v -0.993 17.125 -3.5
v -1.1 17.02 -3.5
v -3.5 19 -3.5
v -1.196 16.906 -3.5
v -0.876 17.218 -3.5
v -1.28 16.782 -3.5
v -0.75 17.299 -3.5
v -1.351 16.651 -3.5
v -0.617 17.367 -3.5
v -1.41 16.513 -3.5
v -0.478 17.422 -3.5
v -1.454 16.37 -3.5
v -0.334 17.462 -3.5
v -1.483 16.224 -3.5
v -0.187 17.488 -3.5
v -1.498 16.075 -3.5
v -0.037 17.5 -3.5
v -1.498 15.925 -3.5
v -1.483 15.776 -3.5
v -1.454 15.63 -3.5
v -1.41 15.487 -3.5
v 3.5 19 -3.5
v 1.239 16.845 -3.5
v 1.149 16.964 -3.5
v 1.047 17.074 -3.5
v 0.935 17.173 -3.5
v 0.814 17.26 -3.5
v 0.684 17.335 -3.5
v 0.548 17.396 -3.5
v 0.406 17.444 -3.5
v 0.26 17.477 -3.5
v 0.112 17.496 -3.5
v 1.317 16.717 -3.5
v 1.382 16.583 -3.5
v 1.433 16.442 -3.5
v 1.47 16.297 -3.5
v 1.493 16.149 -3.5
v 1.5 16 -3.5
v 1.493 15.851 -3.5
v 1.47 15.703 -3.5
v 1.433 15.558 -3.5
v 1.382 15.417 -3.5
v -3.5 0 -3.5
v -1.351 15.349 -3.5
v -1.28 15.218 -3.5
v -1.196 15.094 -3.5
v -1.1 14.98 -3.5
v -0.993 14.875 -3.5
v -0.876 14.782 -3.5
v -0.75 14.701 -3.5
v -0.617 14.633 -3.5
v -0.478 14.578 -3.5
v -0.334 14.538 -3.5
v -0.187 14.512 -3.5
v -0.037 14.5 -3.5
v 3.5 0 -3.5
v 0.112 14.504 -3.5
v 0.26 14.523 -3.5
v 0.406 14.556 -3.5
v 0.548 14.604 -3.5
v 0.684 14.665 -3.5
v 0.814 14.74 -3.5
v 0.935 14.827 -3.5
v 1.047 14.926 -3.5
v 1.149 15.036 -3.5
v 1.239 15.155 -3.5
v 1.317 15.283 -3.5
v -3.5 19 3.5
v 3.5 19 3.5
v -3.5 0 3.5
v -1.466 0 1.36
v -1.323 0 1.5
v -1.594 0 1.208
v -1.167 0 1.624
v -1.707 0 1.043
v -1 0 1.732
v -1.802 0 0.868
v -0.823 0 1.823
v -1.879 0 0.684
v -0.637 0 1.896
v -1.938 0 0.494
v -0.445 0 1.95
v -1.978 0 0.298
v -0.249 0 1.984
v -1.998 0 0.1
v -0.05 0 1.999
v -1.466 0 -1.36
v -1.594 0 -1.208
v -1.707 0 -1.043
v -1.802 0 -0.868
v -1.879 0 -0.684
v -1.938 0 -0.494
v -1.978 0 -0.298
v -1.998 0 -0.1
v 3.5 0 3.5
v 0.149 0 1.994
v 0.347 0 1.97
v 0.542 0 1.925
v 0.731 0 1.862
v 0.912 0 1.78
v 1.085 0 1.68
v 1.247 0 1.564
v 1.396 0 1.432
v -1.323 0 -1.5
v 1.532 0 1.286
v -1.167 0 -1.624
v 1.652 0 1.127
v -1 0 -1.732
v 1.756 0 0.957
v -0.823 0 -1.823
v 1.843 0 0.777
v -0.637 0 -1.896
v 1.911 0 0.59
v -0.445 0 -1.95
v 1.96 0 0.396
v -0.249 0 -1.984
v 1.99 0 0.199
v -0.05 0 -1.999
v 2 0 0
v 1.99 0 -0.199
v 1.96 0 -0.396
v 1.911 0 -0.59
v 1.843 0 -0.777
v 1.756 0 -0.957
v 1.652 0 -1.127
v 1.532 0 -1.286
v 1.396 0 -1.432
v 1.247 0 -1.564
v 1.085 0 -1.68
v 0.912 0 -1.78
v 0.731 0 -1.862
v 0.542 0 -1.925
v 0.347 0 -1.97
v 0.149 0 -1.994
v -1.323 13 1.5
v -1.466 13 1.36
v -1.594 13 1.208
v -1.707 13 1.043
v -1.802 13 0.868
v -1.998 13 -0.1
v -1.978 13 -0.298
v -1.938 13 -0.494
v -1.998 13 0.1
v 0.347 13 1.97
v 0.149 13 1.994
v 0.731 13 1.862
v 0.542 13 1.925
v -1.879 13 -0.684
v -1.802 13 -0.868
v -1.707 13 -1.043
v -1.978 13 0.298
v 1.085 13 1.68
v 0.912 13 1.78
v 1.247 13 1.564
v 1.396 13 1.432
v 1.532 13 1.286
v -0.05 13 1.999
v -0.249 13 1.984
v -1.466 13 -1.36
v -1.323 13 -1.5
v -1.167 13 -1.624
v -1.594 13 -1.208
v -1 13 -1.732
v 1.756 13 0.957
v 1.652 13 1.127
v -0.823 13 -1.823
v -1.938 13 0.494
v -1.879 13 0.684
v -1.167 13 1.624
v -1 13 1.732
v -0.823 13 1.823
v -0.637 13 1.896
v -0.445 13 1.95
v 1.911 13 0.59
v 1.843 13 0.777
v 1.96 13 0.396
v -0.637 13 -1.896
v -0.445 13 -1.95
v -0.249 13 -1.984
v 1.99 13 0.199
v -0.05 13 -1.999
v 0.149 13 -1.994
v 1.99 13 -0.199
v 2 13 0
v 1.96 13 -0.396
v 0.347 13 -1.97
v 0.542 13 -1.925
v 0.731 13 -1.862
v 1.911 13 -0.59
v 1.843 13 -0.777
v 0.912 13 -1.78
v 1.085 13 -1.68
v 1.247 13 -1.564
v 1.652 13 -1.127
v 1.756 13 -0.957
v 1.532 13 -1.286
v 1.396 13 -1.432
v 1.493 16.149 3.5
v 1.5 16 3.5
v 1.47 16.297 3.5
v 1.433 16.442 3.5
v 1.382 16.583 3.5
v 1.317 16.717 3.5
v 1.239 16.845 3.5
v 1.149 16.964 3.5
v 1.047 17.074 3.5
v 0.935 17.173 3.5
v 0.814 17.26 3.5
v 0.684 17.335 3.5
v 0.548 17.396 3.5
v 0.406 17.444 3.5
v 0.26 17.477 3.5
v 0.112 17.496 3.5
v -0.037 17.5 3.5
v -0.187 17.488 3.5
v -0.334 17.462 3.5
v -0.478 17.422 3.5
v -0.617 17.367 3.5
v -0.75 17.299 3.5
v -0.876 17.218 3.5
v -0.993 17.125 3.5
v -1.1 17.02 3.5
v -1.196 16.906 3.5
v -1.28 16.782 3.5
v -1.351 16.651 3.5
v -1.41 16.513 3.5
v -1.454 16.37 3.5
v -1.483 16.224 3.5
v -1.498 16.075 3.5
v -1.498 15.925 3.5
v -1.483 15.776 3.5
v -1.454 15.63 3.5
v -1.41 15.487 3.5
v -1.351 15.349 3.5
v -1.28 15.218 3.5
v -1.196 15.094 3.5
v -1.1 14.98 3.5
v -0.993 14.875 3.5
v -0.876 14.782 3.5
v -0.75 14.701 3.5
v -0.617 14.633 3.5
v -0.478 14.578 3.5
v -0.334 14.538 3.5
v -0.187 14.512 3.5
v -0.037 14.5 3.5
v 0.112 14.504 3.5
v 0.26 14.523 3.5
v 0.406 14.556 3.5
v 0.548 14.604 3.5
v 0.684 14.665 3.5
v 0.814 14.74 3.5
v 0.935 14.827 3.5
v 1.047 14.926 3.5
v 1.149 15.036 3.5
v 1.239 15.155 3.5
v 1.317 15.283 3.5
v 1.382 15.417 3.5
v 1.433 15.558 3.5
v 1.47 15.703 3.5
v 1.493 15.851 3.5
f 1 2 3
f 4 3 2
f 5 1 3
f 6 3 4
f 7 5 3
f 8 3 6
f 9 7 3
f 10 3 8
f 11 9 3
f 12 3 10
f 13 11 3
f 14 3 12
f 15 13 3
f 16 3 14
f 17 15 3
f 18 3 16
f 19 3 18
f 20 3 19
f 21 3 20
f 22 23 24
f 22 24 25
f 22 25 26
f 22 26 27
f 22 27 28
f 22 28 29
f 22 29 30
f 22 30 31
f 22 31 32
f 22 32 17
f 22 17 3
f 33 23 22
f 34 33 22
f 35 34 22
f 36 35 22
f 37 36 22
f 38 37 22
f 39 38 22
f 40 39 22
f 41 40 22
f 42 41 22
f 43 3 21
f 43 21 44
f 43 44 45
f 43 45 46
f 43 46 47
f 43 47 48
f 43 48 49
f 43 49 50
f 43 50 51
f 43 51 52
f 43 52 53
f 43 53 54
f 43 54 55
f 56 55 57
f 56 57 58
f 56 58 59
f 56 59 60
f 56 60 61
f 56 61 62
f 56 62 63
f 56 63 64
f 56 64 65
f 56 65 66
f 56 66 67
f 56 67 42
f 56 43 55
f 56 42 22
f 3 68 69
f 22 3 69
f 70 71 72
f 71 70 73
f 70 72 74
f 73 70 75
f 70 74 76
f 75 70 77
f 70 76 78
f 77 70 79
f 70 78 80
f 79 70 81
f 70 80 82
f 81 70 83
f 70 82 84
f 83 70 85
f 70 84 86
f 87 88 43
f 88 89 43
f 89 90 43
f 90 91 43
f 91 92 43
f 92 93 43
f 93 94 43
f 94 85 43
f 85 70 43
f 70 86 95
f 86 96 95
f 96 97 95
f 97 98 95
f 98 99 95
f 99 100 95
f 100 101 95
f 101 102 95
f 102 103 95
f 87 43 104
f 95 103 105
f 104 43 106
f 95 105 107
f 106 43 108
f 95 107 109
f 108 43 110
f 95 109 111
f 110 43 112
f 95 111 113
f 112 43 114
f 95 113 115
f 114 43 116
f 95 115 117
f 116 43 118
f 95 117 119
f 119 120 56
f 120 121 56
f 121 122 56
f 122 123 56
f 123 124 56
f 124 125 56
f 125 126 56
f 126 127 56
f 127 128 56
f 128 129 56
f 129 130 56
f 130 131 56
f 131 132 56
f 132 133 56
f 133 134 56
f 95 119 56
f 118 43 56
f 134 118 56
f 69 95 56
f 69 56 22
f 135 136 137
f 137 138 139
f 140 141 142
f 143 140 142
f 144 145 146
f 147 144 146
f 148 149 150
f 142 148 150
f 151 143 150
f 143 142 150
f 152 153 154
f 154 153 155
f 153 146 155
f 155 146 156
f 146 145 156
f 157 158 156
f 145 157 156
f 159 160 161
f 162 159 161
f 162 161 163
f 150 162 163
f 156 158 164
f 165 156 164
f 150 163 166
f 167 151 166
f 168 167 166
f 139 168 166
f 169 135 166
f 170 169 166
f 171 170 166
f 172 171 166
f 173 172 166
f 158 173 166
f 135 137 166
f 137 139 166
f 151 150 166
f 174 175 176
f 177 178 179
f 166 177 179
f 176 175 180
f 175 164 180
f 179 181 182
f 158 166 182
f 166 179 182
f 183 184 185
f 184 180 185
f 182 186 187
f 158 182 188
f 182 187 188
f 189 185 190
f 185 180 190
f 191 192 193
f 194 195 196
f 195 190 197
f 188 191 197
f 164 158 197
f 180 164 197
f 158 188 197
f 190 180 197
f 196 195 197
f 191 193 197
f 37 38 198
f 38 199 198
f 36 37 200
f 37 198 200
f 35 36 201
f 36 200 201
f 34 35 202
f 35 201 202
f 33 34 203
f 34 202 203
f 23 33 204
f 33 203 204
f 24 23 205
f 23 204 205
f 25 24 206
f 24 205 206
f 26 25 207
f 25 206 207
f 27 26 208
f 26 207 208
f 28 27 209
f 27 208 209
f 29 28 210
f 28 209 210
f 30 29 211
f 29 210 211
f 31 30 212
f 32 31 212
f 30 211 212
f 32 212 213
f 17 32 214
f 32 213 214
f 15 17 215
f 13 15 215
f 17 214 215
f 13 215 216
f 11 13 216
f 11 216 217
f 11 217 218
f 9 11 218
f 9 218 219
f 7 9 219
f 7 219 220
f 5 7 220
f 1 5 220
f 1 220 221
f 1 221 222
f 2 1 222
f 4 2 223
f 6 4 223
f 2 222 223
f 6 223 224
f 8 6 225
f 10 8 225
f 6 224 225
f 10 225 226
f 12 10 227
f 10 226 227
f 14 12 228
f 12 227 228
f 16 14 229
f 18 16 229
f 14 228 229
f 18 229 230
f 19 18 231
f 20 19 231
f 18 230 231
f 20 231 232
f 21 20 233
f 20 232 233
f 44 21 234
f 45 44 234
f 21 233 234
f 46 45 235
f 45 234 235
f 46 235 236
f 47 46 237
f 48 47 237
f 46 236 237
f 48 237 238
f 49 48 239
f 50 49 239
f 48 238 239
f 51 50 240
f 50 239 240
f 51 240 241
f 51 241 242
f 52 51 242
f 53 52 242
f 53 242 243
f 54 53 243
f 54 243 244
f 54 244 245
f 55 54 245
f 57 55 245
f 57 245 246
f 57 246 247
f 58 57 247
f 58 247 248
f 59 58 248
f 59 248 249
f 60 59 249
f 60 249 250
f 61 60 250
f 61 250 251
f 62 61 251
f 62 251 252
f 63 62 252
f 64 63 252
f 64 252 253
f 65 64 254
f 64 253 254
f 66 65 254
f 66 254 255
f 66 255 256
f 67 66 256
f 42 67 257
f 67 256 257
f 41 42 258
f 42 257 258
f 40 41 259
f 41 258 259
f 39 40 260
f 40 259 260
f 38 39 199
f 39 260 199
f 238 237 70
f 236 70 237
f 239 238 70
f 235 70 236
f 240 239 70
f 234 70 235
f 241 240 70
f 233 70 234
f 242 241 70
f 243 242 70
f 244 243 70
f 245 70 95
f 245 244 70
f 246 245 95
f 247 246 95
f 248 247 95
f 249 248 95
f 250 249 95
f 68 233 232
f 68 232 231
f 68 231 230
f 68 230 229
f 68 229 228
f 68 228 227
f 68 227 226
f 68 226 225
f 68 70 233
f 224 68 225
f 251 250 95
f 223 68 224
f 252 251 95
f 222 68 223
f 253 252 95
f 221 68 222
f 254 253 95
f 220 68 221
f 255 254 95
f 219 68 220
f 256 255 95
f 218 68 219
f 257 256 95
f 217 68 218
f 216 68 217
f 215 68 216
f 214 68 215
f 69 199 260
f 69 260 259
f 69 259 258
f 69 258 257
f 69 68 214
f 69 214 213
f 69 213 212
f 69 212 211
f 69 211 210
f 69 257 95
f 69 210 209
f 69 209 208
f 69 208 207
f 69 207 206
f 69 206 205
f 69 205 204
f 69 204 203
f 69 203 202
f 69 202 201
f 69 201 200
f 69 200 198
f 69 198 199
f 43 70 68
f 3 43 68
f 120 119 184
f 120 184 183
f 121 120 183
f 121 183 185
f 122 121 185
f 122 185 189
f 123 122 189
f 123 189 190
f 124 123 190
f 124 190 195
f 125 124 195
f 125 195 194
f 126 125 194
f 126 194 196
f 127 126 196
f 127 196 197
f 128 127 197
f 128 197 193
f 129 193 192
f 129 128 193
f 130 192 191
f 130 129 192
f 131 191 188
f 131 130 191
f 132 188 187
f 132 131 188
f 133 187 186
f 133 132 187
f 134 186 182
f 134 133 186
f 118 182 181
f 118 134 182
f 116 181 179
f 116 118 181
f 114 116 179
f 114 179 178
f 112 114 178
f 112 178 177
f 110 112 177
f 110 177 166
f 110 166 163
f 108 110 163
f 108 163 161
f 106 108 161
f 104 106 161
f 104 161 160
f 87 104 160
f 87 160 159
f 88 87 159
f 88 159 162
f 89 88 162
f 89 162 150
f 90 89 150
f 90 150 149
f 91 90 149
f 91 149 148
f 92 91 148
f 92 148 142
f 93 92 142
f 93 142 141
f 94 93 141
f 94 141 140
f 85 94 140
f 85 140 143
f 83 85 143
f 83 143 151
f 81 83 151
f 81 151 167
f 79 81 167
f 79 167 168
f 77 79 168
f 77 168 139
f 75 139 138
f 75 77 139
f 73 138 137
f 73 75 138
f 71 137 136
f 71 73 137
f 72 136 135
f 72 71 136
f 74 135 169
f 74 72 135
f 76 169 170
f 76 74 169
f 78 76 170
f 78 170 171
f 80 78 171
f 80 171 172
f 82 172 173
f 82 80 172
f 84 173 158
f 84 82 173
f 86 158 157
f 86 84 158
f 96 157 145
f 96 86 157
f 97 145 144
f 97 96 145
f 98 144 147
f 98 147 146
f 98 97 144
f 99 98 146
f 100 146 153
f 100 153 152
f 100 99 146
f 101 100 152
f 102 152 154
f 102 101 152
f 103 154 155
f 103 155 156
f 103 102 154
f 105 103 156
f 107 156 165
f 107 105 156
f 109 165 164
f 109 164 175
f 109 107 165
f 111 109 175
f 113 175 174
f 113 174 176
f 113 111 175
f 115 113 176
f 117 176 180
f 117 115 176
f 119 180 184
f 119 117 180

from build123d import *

# Parameters (mm, degrees)
SKETCH1_W                       = 7
SKETCH1_H                       = 7
SKETCH1_R                       = 2
BOSS_EXTRUDE1_DEPTH             = 13
BOSS_EXTRUDE2_REACH             = 5.5
SKETCH2_W                       = 7
SKETCH2_H                       = 6
SKETCH2_R                       = 1.5
BOSS_EXTRUDE2_DIRECTION_2_REACH = 5.5


with BuildPart() as part:
    # Sketch1 → Boss-Extrude1 (new body)
    with BuildSketch(Plane(origin=(0, 0, 0), x_dir=(1, 0, 0), z_dir=(0, 1, 0))):
        Rectangle(SKETCH1_W, SKETCH1_H)
        Circle(SKETCH1_R, mode=Mode.SUBTRACT)
    extrude(amount=BOSS_EXTRUDE1_DEPTH)

    # Boss-Extrude2: up to this face of the body (flat: up to its plane)
    boss_extrude2_end = Plane(part.part.faces().sort_by_distance((0, 6.5, 3.5))[0])
    # Sketch2 → Boss-Extrude2 (add, up to the picked face)
    with BuildSketch(Plane.XY, mode=Mode.PRIVATE) as boss_extrude2_sk1:
        with Locations((0, 16)):
            Rectangle(SKETCH2_W, SKETCH2_H)
        with Locations((0, 16)):
            Circle(SKETCH2_R, mode=Mode.SUBTRACT)
    boss_extrude2_tool1 = split(extrude(boss_extrude2_sk1.sketch, amount=BOSS_EXTRUDE2_REACH, mode=Mode.PRIVATE), bisect_by=boss_extrude2_end, keep=Keep.BOTH, mode=Mode.PRIVATE)
    add(boss_extrude2_tool1.solids().sort_by_distance((0, 18.907805, 0))[0])

    # Boss-Extrude2 direction 2: up to this face of the body (flat: up to its plane)
    boss_extrude2_direction_2_end = Plane(part.part.faces().sort_by_distance((0, 6.5, -3.5))[0])
    # Sketch2 → Boss-Extrude2 direction 2 (add, up to the picked face)
    with BuildSketch(Plane.XY, mode=Mode.PRIVATE) as boss_extrude2_direction_2_sk1:
        with Locations((0, 16)):
            Rectangle(SKETCH2_W, SKETCH2_H)
        with Locations((0, 16)):
            Circle(SKETCH2_R, mode=Mode.SUBTRACT)
    boss_extrude2_direction_2_tool1 = split(extrude(boss_extrude2_direction_2_sk1.sketch, amount=-BOSS_EXTRUDE2_DIRECTION_2_REACH, mode=Mode.PRIVATE), bisect_by=boss_extrude2_direction_2_end, keep=Keep.BOTH, mode=Mode.PRIVATE)
    add(boss_extrude2_direction_2_tool1.solids().sort_by_distance((0, 18.907805, 0))[0])


solid = part.part
